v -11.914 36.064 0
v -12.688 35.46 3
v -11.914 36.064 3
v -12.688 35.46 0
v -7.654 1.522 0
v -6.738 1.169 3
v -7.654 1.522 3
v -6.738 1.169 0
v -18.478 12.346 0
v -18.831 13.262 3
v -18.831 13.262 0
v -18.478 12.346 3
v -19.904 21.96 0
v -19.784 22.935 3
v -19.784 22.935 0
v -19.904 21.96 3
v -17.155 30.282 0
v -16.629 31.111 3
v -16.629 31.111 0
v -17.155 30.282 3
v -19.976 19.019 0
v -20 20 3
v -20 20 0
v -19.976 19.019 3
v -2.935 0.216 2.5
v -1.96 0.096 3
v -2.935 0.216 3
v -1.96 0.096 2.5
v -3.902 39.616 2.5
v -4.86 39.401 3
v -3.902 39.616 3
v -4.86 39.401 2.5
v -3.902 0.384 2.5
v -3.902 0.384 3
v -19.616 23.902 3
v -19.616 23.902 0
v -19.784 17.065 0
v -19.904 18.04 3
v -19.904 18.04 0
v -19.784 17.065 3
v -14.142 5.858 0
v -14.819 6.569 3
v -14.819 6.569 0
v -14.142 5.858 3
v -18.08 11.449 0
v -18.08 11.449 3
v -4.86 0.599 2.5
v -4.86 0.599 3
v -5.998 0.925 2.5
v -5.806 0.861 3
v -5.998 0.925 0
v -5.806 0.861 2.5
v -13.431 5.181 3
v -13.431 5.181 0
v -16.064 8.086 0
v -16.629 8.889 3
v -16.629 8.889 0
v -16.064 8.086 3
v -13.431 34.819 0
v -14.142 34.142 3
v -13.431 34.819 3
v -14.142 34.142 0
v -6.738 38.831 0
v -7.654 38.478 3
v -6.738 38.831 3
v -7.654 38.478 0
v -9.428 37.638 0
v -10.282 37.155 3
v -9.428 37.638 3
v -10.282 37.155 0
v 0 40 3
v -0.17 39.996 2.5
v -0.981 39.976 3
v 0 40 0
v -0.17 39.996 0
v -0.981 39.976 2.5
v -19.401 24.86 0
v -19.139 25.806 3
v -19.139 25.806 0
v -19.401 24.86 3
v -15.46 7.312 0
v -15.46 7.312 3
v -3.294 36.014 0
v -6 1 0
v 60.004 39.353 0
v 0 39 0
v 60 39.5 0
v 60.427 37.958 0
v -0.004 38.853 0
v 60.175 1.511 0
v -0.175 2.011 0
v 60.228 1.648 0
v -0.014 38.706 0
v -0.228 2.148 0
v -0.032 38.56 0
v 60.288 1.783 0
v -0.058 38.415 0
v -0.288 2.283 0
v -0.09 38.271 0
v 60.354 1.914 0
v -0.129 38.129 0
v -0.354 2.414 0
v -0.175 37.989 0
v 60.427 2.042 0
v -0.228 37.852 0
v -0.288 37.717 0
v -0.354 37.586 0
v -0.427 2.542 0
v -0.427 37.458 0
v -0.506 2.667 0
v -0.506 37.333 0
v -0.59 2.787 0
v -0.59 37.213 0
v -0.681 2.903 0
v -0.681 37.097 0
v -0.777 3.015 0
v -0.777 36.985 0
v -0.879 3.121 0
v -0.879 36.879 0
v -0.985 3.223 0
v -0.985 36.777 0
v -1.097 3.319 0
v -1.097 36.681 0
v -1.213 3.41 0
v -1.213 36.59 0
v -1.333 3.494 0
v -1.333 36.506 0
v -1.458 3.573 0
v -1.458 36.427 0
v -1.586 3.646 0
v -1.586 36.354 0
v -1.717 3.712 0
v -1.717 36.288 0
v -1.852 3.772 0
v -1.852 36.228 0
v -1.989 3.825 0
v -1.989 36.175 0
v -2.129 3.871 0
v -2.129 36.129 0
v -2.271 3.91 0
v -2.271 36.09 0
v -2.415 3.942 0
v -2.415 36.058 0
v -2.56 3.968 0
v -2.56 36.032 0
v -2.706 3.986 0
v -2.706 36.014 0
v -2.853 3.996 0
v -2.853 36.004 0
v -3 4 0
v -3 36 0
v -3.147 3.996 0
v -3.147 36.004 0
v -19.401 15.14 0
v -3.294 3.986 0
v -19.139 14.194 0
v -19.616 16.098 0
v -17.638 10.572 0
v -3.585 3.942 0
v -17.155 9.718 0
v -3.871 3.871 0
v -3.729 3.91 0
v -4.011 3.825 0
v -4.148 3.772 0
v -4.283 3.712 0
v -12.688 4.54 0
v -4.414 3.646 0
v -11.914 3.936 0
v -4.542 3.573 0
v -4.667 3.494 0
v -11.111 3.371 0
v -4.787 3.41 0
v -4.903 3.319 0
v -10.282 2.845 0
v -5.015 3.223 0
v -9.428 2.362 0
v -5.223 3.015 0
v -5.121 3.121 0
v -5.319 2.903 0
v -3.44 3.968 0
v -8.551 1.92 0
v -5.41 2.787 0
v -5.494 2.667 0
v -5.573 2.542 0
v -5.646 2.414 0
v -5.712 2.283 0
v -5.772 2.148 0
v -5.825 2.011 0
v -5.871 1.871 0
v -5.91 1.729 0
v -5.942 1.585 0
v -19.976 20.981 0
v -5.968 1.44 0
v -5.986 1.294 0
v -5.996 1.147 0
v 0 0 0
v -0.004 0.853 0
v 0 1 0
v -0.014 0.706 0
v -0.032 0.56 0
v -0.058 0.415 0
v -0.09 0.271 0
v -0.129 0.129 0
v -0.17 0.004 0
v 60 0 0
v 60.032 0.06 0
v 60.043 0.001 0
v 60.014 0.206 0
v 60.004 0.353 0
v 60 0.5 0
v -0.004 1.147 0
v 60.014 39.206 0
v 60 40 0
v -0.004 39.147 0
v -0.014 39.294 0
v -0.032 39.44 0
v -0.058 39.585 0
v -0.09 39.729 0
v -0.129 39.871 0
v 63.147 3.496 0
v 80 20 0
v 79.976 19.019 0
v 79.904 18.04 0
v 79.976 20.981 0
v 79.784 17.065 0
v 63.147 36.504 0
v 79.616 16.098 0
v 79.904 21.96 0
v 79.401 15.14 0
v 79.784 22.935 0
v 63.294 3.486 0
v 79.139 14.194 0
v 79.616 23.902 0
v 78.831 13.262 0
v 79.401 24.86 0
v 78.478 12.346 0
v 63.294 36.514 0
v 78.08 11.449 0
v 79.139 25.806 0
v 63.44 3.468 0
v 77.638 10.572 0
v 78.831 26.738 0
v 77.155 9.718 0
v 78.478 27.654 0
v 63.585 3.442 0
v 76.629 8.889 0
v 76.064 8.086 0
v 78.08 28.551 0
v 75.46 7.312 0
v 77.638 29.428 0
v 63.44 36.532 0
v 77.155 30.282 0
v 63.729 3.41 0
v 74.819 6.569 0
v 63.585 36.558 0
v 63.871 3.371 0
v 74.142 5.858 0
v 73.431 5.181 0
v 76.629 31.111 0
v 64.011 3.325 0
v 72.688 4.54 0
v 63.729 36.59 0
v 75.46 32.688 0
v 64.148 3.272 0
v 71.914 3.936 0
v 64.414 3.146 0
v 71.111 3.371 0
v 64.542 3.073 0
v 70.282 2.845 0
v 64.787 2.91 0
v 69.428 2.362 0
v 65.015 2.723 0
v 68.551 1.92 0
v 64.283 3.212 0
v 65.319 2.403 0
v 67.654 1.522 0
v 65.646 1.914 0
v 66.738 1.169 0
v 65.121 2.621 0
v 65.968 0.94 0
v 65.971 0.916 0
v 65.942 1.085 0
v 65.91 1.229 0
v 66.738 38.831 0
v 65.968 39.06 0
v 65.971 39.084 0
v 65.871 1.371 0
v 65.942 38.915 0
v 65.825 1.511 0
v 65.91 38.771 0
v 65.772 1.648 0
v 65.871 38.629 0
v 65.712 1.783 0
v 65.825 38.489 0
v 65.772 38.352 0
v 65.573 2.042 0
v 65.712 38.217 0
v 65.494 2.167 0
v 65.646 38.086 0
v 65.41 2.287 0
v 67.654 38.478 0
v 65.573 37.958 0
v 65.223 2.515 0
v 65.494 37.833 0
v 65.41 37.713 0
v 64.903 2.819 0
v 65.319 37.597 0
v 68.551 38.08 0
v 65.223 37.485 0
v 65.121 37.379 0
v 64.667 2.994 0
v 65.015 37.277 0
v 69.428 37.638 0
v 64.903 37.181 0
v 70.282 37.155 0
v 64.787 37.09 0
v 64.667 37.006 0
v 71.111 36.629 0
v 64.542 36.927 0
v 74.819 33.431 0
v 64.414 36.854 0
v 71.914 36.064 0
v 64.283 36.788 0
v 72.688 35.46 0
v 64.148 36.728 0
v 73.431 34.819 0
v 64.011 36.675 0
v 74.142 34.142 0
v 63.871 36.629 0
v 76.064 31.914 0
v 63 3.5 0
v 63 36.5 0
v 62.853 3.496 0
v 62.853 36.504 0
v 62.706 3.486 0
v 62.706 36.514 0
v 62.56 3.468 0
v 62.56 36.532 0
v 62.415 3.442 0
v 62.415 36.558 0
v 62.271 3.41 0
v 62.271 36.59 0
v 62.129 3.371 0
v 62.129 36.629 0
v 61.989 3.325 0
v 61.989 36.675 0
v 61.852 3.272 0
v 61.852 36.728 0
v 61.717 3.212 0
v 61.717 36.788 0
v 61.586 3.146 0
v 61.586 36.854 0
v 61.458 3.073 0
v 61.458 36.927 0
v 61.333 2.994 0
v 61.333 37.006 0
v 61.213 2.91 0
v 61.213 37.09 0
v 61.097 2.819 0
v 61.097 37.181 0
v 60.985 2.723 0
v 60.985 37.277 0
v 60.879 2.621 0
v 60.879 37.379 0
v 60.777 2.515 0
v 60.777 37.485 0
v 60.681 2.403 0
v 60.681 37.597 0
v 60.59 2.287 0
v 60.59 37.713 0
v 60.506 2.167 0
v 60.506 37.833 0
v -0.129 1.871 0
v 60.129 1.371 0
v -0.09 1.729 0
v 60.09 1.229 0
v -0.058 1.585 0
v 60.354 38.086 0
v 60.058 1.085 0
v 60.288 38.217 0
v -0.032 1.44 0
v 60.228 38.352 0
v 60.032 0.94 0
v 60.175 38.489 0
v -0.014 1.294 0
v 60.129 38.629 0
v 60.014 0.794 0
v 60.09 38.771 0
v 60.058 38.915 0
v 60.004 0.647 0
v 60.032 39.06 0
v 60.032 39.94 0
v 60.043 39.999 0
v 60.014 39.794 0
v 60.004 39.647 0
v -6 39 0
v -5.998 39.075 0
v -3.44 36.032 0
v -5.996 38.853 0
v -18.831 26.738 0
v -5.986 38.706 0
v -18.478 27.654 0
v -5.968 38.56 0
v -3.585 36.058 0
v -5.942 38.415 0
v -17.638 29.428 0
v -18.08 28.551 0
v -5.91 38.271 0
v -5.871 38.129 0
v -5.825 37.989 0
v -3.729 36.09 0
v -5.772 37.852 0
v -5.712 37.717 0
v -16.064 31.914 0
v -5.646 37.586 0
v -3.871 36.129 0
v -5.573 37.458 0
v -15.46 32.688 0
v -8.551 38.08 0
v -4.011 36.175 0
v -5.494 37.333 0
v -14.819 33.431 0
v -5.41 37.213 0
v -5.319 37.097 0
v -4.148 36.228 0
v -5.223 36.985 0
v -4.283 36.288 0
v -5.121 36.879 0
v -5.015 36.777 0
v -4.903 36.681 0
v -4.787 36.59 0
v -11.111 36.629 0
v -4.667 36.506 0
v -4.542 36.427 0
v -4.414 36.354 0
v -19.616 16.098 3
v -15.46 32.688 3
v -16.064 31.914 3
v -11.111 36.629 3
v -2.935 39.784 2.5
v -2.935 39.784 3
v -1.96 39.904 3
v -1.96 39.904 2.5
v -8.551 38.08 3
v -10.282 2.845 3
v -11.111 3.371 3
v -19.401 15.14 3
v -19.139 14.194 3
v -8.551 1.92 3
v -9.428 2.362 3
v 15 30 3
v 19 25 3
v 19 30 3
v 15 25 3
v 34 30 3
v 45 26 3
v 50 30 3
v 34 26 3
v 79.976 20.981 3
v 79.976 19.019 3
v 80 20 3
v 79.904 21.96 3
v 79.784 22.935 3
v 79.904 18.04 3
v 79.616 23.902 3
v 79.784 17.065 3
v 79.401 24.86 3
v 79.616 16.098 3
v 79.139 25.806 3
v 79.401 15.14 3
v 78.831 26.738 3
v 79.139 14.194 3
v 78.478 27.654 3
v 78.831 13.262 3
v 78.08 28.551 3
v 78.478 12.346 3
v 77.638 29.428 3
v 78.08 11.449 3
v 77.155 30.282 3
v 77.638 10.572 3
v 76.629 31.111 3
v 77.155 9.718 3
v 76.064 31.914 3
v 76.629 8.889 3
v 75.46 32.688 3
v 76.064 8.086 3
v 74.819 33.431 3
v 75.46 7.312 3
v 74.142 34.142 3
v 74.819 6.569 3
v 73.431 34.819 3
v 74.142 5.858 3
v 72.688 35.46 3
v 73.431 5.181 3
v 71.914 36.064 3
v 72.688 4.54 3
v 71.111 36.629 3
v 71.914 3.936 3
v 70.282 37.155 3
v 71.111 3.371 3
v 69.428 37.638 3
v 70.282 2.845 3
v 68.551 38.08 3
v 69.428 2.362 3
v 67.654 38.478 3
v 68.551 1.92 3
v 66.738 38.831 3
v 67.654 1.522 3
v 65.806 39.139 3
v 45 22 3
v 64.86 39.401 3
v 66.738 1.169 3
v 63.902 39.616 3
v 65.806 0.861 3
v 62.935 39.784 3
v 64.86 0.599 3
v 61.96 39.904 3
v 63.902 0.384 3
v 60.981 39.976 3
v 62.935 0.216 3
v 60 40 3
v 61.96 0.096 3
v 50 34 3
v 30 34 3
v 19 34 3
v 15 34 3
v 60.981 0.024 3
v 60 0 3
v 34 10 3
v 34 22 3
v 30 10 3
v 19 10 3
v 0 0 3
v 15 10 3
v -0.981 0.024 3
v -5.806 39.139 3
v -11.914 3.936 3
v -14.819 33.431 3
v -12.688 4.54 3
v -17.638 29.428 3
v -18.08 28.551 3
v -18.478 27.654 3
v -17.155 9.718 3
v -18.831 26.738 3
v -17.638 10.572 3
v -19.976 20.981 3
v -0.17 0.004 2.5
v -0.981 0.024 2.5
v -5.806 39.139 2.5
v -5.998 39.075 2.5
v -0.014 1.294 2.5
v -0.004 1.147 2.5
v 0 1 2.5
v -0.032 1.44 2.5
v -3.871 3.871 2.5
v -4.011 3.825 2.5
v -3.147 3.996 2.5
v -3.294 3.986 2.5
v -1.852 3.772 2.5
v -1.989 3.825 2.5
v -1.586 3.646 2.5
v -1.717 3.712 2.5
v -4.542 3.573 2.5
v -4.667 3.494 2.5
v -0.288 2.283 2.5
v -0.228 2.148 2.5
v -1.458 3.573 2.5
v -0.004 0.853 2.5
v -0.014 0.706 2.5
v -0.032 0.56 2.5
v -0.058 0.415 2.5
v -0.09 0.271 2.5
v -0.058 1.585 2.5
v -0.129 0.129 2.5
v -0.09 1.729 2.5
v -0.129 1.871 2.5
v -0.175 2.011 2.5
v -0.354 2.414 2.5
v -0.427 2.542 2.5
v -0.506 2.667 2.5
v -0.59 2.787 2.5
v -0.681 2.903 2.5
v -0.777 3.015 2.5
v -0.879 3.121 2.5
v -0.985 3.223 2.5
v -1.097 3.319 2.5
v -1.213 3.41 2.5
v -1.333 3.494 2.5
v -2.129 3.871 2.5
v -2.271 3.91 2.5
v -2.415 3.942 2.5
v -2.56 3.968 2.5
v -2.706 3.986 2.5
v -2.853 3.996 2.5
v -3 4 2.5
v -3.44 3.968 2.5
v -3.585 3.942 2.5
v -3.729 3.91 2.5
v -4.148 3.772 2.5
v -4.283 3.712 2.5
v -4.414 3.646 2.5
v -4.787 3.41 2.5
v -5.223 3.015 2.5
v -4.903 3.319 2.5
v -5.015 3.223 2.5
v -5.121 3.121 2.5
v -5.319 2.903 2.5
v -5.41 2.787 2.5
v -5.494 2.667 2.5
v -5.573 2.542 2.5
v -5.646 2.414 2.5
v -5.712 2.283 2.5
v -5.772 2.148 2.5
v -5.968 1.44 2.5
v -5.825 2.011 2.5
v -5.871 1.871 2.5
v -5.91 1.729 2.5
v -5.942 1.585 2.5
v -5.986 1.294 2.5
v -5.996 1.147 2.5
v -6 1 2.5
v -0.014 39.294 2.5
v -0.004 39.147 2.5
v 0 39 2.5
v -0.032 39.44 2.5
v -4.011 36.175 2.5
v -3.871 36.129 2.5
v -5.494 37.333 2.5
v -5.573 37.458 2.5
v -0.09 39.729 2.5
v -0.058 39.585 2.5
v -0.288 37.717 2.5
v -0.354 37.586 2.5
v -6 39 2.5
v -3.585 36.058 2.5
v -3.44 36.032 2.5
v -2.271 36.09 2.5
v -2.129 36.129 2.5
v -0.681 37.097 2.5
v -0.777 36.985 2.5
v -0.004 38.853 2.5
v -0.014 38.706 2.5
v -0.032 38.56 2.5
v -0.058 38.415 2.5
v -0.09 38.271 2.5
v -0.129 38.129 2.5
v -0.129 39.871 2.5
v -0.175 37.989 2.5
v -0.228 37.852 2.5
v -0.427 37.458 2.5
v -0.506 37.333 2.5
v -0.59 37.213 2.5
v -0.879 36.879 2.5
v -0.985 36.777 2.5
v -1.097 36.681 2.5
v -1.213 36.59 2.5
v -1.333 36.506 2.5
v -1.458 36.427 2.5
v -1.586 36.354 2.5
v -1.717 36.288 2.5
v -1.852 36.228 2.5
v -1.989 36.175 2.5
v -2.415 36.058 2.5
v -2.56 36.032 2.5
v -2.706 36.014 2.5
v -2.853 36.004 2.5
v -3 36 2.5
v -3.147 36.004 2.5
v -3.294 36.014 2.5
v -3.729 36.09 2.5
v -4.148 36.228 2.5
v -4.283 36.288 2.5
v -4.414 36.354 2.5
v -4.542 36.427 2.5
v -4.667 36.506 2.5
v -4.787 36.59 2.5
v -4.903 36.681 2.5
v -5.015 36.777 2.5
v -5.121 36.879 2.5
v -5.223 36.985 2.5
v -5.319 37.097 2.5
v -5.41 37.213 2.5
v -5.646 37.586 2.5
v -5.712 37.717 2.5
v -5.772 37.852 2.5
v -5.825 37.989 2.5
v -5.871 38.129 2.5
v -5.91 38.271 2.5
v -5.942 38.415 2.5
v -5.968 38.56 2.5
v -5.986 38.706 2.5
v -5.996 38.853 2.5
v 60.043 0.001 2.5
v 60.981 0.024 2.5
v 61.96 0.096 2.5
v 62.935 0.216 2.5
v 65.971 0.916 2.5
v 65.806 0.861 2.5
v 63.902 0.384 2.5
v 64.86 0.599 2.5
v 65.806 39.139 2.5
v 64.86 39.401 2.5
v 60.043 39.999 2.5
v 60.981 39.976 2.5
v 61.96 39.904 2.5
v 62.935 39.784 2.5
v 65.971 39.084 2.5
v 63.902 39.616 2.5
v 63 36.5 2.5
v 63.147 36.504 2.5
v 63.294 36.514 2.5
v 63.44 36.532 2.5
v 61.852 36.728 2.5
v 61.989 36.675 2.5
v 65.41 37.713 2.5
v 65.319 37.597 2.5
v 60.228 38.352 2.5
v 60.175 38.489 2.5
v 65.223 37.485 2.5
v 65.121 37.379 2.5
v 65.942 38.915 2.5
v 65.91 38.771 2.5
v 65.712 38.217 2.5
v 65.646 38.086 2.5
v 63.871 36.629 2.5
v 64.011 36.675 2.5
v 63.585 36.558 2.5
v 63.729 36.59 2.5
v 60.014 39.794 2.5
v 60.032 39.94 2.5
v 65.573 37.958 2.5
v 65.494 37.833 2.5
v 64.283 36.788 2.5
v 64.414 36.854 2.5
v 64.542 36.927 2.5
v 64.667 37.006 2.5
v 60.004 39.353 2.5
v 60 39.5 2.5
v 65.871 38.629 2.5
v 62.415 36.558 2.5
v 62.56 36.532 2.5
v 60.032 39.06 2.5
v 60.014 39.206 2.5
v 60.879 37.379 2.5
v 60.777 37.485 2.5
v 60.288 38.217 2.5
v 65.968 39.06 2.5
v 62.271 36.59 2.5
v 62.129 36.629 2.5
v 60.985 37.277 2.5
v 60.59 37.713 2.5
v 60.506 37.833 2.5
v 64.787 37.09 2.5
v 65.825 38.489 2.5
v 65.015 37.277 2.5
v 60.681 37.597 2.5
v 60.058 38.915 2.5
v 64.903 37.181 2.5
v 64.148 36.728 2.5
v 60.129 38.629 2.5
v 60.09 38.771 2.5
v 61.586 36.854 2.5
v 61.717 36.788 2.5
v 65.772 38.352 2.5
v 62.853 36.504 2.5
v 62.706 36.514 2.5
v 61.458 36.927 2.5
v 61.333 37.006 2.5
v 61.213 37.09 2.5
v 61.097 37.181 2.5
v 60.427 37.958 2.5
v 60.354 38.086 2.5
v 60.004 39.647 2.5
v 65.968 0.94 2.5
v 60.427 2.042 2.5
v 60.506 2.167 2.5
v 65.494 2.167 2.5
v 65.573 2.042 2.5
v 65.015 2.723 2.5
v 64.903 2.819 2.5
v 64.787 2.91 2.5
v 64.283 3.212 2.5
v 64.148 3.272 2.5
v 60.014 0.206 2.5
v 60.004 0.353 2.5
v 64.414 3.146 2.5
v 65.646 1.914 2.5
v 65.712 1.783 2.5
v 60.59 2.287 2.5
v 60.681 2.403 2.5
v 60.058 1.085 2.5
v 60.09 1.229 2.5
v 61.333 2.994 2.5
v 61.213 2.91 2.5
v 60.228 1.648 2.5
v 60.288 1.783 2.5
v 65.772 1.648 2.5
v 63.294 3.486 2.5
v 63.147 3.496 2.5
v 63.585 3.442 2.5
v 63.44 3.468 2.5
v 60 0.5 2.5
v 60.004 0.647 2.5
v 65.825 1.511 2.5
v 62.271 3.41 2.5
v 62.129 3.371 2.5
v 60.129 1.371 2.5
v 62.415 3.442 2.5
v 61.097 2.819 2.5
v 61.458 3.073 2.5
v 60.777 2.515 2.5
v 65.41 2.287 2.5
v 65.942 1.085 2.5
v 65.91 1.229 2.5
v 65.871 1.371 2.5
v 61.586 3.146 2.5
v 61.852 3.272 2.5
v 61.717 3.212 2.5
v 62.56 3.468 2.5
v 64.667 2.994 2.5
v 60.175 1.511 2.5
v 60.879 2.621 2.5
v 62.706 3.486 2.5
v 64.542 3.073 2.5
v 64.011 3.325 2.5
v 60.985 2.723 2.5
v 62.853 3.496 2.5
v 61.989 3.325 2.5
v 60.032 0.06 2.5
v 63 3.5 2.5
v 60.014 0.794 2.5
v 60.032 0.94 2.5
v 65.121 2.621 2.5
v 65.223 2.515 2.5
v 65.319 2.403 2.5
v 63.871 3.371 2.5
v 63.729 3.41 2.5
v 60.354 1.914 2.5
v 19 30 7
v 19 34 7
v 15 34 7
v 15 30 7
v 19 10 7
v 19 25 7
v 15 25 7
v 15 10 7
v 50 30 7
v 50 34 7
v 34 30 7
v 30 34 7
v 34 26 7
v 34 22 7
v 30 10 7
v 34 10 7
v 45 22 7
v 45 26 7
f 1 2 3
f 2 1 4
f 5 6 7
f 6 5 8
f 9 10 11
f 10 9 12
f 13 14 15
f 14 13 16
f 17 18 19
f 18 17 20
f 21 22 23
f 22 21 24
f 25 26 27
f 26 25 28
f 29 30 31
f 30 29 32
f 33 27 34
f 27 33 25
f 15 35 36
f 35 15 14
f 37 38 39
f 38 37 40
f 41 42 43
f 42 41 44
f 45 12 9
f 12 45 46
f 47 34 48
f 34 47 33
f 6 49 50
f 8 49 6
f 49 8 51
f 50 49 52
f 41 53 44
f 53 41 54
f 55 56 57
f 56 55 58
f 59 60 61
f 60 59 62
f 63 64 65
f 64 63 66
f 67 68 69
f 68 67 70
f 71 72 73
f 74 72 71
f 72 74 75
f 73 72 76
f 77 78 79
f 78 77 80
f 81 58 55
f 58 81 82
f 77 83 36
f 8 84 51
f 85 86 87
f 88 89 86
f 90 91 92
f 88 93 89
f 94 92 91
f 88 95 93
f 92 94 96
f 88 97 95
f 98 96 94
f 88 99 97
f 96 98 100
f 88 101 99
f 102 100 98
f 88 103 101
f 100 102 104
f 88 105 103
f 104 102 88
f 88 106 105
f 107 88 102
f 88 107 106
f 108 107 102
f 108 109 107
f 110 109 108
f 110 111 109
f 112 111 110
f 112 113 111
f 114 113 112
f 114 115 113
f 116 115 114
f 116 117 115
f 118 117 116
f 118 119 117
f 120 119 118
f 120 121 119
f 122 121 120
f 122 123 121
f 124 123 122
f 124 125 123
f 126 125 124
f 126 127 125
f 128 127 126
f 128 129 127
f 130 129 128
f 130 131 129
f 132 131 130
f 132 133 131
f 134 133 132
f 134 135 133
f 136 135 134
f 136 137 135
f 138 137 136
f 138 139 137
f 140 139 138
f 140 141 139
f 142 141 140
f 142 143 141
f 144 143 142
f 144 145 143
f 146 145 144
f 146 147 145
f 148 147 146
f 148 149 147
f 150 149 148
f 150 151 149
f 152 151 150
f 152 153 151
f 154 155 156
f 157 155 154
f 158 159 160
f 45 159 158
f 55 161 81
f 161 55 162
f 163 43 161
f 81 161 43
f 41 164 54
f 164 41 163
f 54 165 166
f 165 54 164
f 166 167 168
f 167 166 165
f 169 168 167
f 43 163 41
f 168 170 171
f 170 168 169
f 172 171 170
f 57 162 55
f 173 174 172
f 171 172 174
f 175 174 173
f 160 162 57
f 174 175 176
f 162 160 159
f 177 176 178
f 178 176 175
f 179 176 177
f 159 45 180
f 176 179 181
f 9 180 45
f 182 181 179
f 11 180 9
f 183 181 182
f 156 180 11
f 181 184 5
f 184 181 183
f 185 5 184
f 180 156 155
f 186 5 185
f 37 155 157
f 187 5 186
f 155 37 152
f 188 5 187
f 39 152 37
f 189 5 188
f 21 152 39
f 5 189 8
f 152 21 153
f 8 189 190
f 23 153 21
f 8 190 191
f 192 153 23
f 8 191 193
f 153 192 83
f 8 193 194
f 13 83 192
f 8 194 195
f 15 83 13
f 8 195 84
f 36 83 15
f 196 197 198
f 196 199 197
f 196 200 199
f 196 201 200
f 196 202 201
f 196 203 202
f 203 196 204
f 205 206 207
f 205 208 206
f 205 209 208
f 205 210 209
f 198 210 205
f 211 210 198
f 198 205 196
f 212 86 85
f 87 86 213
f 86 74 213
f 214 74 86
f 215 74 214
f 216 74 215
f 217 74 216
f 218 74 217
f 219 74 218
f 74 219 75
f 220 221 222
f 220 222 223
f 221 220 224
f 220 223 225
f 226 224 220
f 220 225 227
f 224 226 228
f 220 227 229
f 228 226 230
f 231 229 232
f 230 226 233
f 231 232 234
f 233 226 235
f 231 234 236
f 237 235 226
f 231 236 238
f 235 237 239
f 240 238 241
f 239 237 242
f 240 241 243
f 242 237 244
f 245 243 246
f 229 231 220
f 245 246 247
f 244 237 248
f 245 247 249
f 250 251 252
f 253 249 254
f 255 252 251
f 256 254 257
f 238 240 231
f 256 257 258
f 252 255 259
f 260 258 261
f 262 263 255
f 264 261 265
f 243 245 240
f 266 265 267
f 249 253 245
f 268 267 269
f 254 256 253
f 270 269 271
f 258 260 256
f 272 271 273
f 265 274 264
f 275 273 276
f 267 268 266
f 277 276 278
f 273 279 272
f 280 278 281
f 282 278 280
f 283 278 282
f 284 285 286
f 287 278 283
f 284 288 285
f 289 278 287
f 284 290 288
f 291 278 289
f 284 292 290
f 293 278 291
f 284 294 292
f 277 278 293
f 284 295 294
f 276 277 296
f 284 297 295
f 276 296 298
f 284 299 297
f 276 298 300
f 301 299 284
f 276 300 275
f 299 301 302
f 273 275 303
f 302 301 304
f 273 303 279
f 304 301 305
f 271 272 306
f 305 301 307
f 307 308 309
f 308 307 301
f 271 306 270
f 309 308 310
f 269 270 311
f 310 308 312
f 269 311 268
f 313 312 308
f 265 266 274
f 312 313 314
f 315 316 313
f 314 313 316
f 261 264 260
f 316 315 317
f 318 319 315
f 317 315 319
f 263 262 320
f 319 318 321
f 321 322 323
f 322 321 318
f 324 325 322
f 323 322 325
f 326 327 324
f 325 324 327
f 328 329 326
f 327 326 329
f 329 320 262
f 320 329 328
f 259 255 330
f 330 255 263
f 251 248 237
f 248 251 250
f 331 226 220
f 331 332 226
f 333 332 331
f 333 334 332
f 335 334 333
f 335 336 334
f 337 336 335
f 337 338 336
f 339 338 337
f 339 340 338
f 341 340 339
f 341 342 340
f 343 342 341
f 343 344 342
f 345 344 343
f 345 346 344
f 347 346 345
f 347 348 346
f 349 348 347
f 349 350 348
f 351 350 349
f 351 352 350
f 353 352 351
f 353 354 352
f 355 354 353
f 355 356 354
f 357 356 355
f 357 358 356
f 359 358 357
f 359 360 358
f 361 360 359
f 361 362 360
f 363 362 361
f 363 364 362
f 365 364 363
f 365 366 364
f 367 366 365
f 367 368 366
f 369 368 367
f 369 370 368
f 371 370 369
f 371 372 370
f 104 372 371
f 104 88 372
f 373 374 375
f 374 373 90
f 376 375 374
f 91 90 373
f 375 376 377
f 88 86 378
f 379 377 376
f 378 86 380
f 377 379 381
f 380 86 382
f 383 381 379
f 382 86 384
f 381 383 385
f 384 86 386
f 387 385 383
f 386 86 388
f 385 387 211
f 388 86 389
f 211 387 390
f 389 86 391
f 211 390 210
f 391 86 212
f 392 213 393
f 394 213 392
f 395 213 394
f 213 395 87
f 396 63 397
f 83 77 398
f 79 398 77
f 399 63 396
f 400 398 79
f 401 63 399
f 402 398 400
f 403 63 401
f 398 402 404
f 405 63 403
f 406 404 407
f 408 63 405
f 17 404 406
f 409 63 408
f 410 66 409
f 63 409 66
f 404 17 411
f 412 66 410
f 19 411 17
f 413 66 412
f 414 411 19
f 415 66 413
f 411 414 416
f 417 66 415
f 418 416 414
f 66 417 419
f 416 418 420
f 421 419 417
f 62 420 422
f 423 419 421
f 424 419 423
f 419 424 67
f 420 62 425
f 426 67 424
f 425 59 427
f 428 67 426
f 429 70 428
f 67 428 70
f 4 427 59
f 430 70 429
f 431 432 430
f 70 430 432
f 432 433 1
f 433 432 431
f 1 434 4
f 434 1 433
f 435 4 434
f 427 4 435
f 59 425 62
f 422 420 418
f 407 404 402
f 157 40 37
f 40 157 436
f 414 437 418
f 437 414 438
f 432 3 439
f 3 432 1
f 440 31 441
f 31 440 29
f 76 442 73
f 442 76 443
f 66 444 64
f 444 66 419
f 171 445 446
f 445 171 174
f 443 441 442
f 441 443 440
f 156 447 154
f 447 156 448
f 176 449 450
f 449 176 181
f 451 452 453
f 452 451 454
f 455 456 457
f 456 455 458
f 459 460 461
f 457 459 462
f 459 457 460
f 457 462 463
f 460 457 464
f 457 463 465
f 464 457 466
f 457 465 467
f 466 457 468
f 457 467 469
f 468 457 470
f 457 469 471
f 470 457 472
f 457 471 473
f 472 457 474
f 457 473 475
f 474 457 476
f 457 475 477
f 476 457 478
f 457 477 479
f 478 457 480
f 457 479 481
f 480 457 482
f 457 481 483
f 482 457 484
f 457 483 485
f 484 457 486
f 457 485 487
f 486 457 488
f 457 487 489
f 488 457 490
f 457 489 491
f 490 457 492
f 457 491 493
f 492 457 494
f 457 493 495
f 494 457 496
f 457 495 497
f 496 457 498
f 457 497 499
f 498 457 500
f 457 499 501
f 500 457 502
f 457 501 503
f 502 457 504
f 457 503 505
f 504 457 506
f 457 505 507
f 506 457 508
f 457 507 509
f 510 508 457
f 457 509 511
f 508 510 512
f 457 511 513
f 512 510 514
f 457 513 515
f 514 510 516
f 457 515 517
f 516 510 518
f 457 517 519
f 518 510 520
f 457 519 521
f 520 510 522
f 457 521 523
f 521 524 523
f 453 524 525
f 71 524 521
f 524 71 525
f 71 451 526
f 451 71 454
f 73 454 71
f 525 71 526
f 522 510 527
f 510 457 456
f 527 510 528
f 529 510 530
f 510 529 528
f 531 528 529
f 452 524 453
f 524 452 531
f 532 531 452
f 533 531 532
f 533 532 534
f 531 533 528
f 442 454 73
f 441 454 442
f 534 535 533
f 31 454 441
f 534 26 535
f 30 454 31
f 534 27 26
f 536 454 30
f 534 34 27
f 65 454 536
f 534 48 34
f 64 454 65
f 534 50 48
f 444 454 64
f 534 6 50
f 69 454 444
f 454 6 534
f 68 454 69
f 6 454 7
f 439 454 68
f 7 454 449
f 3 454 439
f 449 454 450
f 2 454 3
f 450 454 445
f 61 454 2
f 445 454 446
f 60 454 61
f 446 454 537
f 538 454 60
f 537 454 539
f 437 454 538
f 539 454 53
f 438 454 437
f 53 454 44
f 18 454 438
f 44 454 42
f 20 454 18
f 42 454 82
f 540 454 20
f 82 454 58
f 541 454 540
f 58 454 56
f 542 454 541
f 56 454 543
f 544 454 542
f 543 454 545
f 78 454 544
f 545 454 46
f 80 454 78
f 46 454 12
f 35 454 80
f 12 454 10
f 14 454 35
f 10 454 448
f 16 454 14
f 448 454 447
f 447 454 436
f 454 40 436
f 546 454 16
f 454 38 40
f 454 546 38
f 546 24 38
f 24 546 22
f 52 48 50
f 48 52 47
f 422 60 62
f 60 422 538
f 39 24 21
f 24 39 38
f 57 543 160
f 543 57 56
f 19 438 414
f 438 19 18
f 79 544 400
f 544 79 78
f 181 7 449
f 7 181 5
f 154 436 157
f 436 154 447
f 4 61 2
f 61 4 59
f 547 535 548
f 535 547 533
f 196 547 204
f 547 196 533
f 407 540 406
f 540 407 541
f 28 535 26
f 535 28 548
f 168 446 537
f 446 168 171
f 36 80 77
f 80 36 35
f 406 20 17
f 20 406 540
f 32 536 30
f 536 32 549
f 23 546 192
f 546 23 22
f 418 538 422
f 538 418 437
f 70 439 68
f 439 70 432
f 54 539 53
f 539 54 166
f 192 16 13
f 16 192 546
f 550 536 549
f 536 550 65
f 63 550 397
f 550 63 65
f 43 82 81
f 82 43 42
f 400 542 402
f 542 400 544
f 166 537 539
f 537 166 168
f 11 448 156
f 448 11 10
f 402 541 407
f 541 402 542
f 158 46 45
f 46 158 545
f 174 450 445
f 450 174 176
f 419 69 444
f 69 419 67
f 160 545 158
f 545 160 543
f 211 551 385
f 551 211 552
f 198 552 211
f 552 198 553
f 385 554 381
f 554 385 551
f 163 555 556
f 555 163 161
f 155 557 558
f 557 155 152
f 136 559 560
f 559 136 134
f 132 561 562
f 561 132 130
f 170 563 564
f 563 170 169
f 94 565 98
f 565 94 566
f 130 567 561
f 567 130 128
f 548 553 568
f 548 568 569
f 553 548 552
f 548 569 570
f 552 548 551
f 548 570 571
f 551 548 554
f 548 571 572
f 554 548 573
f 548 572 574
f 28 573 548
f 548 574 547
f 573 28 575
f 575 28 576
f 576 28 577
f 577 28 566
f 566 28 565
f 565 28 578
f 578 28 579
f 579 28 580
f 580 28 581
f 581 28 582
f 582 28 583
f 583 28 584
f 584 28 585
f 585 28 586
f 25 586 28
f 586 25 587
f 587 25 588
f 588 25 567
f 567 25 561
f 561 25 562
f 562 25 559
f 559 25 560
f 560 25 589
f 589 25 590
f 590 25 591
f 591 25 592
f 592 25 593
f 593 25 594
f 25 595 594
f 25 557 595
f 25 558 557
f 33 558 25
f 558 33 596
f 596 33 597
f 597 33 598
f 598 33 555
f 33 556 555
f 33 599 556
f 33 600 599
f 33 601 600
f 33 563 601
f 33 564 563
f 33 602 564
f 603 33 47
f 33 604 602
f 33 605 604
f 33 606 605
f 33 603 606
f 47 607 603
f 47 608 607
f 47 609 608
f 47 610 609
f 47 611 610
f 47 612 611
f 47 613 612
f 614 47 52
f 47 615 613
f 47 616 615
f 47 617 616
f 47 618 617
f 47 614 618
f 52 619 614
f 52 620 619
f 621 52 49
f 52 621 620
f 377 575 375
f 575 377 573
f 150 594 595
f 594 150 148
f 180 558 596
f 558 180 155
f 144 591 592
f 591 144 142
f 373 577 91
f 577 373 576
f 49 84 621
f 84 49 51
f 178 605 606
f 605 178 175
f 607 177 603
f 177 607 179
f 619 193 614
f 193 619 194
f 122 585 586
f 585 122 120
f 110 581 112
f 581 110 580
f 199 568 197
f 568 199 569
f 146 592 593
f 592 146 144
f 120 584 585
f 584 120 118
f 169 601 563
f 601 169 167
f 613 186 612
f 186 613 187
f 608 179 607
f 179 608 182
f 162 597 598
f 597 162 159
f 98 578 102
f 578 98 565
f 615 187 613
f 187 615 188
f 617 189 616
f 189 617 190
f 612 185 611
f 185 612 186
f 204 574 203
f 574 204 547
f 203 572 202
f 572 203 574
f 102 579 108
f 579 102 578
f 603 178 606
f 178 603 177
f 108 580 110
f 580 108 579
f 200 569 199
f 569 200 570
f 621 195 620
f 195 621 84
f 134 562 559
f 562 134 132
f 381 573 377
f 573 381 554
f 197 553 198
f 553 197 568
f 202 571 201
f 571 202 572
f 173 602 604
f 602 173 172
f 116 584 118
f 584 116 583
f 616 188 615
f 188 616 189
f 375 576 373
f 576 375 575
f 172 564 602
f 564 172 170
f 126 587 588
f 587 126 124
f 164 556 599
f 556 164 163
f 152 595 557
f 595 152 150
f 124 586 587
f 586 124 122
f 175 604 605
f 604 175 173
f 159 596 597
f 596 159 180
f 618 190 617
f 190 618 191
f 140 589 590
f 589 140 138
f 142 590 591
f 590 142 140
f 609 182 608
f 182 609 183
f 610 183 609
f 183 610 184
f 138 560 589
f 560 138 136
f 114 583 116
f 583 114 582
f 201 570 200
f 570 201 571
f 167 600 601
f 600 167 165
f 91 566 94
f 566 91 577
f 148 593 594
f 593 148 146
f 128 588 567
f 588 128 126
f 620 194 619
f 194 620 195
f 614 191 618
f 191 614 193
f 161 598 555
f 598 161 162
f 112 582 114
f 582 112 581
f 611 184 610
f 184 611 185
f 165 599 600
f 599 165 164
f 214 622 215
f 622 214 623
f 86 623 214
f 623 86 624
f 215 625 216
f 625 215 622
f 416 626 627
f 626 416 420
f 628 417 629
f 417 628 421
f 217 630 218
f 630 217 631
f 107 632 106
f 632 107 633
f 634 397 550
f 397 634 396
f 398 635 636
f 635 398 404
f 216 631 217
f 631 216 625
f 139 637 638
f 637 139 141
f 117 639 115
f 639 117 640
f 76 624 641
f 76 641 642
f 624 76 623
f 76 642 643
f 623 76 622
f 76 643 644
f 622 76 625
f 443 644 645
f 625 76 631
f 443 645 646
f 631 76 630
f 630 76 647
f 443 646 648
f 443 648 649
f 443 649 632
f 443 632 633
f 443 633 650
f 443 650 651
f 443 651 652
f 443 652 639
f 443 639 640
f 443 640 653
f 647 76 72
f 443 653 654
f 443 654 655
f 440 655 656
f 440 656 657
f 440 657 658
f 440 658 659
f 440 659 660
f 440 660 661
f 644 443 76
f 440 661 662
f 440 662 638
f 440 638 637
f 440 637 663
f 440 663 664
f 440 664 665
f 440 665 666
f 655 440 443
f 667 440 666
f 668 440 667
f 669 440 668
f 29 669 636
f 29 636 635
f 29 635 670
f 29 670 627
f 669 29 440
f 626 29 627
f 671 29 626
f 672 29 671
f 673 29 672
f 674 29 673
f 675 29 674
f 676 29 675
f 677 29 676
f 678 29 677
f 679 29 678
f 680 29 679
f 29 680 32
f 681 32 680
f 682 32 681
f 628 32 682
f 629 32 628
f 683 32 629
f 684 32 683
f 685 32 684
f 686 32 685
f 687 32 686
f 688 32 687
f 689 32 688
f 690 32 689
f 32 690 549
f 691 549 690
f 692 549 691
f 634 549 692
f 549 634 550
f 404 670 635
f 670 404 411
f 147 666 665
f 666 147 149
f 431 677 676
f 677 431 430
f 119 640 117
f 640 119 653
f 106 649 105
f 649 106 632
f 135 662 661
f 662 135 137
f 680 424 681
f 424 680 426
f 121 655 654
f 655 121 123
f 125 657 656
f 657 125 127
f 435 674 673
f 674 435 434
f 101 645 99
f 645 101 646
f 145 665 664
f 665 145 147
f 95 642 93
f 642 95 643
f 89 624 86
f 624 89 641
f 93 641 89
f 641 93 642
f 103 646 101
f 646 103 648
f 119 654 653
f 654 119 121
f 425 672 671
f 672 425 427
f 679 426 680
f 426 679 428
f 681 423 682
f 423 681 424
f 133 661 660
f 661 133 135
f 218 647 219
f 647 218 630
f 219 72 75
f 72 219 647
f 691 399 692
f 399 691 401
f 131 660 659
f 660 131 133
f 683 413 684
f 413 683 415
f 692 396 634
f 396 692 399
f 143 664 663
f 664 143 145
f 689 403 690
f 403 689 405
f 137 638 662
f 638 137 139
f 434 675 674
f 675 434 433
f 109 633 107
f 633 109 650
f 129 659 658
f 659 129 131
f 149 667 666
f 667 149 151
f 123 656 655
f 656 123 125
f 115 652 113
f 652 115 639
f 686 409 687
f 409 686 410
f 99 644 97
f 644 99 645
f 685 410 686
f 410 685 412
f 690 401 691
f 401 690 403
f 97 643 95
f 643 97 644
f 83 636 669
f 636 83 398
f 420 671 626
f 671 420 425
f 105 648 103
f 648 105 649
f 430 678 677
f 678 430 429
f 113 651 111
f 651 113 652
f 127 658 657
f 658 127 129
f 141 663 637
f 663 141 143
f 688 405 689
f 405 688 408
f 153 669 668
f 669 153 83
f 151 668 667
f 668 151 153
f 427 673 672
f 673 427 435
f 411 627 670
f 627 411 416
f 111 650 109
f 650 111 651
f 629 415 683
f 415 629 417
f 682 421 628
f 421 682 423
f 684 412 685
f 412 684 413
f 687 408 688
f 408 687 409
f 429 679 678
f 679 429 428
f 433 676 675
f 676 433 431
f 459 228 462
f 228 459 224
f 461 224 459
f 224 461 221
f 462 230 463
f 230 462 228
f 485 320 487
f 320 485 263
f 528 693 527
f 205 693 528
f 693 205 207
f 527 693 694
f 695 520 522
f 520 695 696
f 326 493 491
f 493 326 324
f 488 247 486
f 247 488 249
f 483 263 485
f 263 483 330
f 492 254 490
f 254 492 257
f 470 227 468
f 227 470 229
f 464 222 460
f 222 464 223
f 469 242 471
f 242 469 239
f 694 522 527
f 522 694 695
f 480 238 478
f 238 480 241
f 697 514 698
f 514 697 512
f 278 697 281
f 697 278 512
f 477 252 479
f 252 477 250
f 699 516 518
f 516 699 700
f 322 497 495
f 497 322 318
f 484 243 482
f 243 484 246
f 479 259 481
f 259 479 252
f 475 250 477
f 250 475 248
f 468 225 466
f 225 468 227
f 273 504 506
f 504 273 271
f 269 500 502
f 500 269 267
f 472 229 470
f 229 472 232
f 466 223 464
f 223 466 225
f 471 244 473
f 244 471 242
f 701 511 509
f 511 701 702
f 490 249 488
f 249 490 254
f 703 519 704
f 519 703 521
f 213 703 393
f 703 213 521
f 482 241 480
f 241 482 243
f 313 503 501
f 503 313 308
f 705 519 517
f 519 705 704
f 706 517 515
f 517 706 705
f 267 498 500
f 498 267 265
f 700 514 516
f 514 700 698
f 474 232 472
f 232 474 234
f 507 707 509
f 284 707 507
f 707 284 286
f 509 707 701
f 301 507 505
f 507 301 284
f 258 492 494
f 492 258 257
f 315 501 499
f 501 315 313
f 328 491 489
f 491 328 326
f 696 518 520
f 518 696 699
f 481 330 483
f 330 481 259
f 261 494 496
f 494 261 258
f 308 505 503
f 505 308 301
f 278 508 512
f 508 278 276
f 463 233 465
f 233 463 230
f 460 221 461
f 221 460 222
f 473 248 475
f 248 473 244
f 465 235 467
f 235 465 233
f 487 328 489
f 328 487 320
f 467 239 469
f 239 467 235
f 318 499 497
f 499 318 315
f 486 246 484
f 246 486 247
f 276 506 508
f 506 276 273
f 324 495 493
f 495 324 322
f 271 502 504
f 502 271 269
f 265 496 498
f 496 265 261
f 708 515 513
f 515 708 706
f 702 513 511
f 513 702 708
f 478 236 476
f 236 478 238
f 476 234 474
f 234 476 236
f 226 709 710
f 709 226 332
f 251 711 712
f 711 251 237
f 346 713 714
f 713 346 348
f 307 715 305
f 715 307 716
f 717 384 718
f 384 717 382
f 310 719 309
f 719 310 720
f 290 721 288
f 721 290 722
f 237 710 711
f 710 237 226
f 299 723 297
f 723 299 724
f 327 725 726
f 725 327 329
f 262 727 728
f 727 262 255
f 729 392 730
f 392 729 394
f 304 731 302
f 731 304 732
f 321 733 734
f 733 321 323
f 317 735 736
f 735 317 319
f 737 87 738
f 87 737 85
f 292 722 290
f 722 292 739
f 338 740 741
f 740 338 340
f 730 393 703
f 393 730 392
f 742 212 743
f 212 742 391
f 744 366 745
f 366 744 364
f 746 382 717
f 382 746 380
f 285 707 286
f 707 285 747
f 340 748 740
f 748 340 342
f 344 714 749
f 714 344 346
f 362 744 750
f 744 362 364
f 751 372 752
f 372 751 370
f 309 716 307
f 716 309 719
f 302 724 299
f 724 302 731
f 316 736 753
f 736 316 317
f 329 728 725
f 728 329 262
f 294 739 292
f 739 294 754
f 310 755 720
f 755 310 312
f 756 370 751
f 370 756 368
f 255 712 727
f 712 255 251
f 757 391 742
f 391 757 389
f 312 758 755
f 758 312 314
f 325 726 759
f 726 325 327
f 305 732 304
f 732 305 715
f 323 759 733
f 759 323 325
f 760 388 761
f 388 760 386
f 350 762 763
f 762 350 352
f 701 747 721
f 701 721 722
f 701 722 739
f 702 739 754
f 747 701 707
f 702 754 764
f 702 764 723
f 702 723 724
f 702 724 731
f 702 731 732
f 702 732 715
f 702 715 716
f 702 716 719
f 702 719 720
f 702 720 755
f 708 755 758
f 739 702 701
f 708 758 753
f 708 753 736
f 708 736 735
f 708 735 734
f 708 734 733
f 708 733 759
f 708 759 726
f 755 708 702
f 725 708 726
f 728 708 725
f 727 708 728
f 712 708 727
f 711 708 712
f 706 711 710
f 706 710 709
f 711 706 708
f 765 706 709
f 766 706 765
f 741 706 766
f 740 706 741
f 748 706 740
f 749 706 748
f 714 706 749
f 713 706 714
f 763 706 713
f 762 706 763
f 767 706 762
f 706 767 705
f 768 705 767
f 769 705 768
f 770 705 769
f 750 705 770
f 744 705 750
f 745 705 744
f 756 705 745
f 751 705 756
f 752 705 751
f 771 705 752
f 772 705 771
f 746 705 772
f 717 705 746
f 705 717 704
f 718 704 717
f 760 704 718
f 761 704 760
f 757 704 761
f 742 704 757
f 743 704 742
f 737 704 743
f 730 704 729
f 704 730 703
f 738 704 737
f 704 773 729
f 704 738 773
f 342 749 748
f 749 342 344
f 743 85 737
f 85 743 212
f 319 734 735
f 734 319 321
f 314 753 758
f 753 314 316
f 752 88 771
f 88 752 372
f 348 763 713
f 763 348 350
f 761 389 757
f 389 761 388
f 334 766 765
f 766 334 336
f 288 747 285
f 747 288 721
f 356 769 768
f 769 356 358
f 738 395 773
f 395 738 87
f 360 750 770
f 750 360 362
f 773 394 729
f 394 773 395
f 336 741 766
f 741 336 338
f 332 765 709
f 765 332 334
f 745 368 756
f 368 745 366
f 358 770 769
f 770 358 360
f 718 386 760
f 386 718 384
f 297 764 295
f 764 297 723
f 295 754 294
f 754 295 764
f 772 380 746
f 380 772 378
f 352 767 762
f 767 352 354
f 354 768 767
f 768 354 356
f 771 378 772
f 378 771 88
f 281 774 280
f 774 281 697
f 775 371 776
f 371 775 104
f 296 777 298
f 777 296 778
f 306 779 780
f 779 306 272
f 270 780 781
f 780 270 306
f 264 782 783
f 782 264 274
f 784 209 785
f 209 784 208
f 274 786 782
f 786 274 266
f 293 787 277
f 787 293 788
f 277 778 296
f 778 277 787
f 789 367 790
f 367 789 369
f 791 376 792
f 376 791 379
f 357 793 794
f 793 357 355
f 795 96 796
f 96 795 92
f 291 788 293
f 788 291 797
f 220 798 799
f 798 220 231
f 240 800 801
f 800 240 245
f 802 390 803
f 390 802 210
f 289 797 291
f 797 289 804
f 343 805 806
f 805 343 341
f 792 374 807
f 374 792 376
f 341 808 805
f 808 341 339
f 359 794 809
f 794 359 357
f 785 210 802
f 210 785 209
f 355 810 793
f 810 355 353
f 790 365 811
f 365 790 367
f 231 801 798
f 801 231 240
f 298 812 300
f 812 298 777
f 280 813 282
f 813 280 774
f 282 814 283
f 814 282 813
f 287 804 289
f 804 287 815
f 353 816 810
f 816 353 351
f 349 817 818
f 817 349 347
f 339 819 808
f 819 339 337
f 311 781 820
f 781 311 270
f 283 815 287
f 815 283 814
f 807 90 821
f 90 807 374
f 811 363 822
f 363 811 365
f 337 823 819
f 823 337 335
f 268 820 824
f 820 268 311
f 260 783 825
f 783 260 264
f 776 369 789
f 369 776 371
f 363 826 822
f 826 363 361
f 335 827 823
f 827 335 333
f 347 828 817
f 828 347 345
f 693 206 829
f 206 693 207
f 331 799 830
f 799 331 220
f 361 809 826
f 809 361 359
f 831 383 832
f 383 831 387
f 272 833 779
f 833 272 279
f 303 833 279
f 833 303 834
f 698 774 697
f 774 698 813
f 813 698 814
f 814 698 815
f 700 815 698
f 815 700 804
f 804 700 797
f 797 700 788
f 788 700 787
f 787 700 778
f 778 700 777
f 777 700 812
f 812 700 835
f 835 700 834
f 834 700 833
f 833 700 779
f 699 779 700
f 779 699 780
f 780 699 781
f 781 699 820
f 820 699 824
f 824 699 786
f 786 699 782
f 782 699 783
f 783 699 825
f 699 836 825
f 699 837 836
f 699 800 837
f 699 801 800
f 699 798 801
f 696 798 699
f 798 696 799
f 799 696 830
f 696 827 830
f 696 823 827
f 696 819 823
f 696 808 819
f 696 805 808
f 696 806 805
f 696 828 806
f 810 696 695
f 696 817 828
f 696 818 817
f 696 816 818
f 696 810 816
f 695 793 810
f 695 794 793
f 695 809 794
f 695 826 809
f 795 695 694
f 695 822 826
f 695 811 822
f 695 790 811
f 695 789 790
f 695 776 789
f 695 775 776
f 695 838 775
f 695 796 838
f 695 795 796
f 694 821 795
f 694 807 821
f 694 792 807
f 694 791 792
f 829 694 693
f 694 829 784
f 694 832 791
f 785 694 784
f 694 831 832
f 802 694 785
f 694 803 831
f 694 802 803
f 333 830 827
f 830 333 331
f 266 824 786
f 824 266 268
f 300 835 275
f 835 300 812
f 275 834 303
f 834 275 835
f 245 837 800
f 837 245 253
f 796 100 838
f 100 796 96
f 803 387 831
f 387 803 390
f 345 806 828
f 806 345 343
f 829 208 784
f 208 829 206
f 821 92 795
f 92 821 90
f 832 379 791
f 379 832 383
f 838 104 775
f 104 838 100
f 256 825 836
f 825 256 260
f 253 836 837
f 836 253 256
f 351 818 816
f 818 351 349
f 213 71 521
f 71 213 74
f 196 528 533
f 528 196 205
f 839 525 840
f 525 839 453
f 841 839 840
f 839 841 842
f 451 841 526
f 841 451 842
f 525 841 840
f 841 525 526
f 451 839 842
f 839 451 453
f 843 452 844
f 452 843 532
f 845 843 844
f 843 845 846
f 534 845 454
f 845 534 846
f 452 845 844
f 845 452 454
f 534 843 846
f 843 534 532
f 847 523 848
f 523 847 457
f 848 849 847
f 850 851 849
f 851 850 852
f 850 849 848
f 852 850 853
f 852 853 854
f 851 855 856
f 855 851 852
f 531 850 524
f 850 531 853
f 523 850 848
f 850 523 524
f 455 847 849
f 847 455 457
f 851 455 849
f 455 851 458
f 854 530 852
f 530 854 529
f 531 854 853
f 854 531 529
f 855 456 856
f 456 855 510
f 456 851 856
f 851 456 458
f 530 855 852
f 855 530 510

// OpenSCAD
//Pavel Shalaginov
$fn=128;
union(){
//основа и отверстия в ней 
 
cube([60,40,3]);
difference(){ 
  translate([0,20,1.5]) cylinder(h=3,r1=20,r2=20, center=true);
translate([-3,1,-0.5]) cylinder(3,3,3);
translate([-3,39,-0.5]) cylinder(3,3,3);
 
}
difference(){
 
translate([60,20,1.5]) cylinder(h=3,r1=20,r2=20, center=true);
translate([63,39.5,-0.5]) cylinder(3,3,3);
translate([63,0.5,-0.5]) cylinder(3,3,3);  
}
 
 
//буква i
  translate([15,30,3]) cube(4); 
 translate([15,10,3]) cube([4,15,4]); 
 
 //буква F
  translate([30,30,3]) cube([20,4,4]);
  translate([30,10,3]) cube([4,20,4]);
  translate([30,22,3]) cube([15,4,4]);
}
